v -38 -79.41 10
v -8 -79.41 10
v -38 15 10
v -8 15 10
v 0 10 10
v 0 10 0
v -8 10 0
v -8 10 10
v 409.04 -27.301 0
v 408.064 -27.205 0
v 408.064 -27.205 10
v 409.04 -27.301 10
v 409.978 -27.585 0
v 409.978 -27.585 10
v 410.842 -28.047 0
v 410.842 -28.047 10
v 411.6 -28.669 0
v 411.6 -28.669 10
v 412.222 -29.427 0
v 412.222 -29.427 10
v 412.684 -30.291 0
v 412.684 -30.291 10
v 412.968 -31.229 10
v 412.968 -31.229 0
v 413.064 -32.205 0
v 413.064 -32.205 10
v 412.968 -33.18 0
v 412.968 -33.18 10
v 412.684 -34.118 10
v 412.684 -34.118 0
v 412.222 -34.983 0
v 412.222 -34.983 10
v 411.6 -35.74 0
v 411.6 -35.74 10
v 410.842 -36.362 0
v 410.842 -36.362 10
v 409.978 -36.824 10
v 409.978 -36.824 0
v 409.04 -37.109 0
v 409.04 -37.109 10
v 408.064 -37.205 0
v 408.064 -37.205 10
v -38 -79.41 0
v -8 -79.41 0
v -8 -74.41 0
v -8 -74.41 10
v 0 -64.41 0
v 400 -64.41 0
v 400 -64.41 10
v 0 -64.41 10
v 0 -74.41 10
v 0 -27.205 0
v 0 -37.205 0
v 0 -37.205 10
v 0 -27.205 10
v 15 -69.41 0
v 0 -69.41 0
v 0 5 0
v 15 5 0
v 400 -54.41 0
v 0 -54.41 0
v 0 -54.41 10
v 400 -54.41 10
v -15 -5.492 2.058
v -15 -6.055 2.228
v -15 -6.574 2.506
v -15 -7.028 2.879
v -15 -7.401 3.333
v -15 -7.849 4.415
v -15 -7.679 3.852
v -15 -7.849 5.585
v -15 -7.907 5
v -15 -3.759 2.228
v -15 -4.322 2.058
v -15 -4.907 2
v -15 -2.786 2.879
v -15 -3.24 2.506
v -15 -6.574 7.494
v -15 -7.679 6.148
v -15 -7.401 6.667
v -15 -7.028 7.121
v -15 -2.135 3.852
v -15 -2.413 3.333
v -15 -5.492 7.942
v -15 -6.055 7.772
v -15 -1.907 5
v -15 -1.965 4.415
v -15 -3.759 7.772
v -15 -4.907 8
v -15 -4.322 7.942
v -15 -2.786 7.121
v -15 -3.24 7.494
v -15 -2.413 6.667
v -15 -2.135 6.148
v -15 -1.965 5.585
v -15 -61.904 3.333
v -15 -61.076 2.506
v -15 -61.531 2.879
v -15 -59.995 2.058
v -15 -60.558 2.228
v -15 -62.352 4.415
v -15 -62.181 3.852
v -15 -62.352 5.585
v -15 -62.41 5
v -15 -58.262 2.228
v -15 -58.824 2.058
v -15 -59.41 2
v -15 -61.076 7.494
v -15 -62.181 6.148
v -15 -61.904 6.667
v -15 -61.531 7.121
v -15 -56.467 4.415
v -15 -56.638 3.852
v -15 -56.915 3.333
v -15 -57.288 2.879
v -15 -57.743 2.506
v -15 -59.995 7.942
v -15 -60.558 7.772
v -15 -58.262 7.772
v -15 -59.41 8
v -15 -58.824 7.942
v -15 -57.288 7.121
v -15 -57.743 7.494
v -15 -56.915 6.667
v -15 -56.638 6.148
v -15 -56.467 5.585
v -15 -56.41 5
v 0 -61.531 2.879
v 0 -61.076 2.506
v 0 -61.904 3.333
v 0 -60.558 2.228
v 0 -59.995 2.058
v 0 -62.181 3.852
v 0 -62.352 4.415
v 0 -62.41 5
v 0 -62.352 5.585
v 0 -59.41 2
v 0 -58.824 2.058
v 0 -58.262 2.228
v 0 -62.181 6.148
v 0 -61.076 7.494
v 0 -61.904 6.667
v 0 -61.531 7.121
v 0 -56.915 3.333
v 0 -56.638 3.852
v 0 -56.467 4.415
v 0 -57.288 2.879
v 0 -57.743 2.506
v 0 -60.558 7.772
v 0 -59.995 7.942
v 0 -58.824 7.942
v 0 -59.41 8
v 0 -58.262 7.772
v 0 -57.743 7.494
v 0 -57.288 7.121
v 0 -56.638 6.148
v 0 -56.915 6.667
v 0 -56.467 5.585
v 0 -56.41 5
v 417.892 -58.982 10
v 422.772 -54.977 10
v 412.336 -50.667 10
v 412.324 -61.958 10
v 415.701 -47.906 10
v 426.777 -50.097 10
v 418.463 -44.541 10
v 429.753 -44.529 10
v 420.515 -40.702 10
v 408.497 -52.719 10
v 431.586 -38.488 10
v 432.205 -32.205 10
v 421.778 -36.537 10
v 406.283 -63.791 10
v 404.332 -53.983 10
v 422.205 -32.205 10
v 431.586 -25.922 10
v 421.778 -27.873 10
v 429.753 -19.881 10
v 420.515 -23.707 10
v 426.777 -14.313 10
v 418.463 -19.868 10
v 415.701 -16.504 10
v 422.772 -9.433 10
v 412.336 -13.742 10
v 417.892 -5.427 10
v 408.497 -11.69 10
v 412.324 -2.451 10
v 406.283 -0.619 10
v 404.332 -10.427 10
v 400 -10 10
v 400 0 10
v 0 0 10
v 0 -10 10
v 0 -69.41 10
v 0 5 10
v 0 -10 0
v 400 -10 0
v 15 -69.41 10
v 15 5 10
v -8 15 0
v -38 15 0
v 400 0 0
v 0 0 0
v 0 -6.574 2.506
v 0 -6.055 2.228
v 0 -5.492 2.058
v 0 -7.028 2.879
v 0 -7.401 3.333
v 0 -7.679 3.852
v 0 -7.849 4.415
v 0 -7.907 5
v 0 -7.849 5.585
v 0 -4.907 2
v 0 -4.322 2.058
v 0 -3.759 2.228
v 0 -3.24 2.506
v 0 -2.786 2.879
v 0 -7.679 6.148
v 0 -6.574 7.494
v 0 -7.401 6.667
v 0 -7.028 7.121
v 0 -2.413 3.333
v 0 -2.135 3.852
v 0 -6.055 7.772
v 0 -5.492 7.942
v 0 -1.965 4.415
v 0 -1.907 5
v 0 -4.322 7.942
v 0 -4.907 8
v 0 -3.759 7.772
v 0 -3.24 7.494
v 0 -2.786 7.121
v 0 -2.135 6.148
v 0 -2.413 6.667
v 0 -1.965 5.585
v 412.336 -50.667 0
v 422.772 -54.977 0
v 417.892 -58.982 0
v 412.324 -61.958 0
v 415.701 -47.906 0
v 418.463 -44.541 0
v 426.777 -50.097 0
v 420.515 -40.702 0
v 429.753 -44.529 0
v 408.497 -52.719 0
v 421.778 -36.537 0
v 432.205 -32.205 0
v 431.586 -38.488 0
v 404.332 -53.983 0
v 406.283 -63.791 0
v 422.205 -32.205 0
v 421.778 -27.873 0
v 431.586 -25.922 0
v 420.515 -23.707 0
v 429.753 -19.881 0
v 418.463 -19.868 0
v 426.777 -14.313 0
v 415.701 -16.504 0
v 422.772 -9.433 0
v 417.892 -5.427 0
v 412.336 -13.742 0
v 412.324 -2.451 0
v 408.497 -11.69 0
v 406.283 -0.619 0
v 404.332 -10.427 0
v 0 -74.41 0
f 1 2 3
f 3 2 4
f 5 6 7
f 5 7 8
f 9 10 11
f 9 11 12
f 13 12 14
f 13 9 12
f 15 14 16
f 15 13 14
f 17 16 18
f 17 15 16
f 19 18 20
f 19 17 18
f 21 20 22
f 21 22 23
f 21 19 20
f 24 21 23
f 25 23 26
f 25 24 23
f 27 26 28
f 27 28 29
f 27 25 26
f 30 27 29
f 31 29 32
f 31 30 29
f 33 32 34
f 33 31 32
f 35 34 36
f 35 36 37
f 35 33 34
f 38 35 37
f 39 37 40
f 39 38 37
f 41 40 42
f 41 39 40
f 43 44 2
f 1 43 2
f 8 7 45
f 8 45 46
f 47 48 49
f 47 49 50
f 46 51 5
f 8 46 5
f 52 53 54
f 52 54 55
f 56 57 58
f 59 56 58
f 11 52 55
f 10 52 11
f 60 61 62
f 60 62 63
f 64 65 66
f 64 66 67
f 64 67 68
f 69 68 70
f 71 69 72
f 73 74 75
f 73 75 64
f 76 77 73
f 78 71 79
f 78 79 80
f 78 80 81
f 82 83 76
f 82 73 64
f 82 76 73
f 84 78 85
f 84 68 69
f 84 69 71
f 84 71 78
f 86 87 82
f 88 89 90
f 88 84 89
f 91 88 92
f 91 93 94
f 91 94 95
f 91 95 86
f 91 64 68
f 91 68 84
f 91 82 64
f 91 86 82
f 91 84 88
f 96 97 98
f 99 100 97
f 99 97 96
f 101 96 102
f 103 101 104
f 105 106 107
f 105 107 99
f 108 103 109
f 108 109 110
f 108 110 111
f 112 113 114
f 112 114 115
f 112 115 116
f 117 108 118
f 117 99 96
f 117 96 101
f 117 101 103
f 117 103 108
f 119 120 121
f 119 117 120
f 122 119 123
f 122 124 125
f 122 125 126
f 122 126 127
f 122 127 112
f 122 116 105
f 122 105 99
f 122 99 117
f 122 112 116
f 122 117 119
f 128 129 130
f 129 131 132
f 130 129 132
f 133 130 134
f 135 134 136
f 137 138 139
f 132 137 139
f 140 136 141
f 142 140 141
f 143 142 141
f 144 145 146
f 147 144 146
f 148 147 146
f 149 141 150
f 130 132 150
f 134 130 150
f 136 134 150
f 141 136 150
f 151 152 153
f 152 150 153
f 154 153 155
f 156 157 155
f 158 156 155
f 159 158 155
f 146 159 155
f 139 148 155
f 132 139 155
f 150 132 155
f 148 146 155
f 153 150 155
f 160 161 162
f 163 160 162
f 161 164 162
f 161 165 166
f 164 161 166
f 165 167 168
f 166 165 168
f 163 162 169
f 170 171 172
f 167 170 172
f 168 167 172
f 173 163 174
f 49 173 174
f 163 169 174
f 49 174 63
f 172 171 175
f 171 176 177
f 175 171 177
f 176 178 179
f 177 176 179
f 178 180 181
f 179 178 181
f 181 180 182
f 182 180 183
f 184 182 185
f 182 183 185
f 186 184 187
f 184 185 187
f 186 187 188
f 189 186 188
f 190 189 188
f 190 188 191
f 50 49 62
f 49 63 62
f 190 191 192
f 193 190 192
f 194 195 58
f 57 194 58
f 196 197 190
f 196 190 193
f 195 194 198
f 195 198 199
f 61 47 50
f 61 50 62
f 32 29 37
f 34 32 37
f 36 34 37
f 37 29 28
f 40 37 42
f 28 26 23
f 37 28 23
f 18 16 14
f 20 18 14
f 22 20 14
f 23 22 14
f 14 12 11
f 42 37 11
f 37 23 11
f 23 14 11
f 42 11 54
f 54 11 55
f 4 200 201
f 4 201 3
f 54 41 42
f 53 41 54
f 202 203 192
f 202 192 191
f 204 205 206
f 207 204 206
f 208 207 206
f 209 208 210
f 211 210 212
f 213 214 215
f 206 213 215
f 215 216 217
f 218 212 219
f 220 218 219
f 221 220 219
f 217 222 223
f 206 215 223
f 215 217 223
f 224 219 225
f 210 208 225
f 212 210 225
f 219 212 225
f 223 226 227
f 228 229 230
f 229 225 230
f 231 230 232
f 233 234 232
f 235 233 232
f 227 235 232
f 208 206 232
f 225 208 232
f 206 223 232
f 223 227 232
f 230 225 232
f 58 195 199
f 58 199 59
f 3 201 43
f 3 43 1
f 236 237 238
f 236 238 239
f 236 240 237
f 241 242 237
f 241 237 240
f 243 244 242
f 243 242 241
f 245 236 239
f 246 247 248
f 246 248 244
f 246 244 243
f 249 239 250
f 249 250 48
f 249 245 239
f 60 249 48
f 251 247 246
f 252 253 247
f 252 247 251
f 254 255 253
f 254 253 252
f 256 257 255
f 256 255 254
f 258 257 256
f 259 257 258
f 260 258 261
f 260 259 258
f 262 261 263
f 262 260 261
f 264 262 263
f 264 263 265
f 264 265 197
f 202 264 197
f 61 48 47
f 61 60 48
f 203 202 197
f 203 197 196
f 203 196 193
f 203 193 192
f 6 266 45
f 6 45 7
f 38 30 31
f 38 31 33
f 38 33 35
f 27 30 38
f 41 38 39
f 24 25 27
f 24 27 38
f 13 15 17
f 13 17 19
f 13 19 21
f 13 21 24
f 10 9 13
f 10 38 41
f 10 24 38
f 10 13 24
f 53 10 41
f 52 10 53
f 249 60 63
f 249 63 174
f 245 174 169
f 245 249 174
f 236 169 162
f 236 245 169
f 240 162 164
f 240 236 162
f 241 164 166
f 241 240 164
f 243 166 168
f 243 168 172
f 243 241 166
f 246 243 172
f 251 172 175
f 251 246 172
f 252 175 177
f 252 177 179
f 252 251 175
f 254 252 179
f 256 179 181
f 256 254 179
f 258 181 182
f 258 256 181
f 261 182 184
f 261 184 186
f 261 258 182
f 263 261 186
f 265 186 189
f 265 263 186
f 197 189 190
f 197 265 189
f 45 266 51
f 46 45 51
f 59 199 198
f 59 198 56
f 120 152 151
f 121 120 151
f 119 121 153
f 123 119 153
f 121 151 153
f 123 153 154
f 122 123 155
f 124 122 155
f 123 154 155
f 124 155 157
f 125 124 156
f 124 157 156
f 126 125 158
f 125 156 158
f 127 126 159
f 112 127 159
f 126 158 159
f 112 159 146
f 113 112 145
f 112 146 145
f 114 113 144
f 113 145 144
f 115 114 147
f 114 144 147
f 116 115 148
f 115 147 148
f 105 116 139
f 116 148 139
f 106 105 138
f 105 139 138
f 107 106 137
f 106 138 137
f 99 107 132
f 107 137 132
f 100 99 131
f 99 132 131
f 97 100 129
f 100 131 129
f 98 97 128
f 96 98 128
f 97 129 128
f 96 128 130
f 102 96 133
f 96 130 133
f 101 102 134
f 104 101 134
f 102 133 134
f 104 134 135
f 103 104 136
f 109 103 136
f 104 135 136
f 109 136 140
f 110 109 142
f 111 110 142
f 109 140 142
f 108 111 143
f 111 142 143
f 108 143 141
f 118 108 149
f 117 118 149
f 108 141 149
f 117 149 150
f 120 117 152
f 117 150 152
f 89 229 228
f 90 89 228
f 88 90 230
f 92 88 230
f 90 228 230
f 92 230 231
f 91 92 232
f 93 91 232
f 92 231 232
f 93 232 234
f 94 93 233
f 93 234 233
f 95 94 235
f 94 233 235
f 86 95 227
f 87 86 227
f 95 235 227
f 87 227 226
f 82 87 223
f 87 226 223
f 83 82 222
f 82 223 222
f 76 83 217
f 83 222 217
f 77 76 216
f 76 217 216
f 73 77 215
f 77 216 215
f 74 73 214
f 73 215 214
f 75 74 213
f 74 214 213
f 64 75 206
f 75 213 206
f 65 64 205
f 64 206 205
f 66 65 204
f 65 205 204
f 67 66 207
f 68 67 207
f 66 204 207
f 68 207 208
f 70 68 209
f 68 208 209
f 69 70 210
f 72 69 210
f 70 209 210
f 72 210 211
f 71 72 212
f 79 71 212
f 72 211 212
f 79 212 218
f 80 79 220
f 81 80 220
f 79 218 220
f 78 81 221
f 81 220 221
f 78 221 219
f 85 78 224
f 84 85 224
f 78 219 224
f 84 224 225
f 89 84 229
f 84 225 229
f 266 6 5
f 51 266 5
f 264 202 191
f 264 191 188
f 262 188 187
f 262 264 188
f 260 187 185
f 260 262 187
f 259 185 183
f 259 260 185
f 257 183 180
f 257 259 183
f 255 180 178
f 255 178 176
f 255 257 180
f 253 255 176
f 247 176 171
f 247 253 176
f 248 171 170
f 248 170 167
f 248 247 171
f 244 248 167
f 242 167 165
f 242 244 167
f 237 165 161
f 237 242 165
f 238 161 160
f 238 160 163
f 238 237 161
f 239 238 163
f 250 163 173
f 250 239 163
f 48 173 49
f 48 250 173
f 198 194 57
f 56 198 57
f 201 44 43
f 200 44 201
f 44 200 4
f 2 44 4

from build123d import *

# Parameters (mm, degrees)
BOSS_EXTRUDE1_DEPTH   = 10
BOSS_EXTRUDE1_2_DEPTH = 10
SKETCH2_R             = 3
BOSS_EXTRUDE2_DEPTH   = 15
SKETCH3_R             = 3
BOSS_EXTRUDE3_DEPTH   = 15
SKETCH4_W             = 10
SKETCH4_H             = 74.409684446
BOSS_EXTRUDE4_DEPTH   = 15
SKETCH5_W             = 10
SKETCH5_H             = 84.409684446
BOSS_EXTRUDE5_DEPTH   = 8
SKETCH6_W             = 10
SKETCH6_H             = 94.409684446
BOSS_EXTRUDE6_DEPTH   = 30


with BuildPart() as part:
    # Sketch1 → Boss-Extrude1 (new body)
    with BuildSketch(Plane.XY):
        with BuildLine():
            Line((0, 0), (400, 0))
            ThreePointArc((400, 0), (432.204842223, -32.204842223), (400, -64.409684446))
            Line((400, -64.409684446), (0, -64.409684446))
            Line((0, -64.409684446), (0, -54.409684446))
            Line((0, -54.409684446), (400, -54.409684446))
            ThreePointArc((400, -54.409684446), (422.204842223, -32.204842223), (400, -10))
            Line((400, -10), (0, -10))
            Line((0, -10), (0, 0))
        make_face()
    extrude(amount=BOSS_EXTRUDE1_DEPTH)


with BuildPart() as body_2:
    # Sketch1 → Boss-Extrude1 2 (new body)
    with BuildSketch(Plane.XY):
        with BuildLine():
            Line((0, -27.204842223), (408.064158914, -27.204842223))
            ThreePointArc((408.064158914, -27.204842223), (413.064158914, -32.204842223), (408.064158914, -37.204842223))
            Line((408.064158914, -37.204842223), (0, -37.204842223))
            Line((0, -37.204842223), (0, -27.204842223))
        make_face()
    extrude(amount=BOSS_EXTRUDE1_2_DEPTH)


with BuildPart() as body_3:
    # Sketch2 → Boss-Extrude2 (new body)
    with BuildSketch(Plane.ZY):
        with Locations((5, -4.906979909)):
            Circle(SKETCH2_R)
    extrude(amount=BOSS_EXTRUDE2_DEPTH)


with BuildPart() as body_4:
    # Sketch3 → Boss-Extrude3 (new body)
    with BuildSketch(Plane.ZY):
        with Locations((5, -59.409684446)):
            Circle(SKETCH3_R)
    extrude(amount=BOSS_EXTRUDE3_DEPTH)


with BuildPart() as body_5:
    # Sketch4 → Boss-Extrude4 (new body)
    with BuildSketch(Plane(origin=(0, 0, 0), x_dir=(0, 0, -1), z_dir=(1, 0, 0))):
        with Locations((-5, -32.204842223)):
            Rectangle(SKETCH4_W, SKETCH4_H)
    extrude(amount=BOSS_EXTRUDE4_DEPTH)


with BuildPart() as body_6:
    # Sketch5 → Boss-Extrude5 (new body)
    with BuildSketch(Plane.ZY):
        with Locations((5, -32.204842223)):
            Rectangle(SKETCH5_W, SKETCH5_H)
    extrude(amount=BOSS_EXTRUDE5_DEPTH)


with BuildPart() as body_7:
    # Sketch6 → Boss-Extrude6 (new body)
    with BuildSketch(Plane.ZY.offset(8)):
        with Locations((5, -32.204842223)):
            Rectangle(SKETCH6_W, SKETCH6_H)
    extrude(amount=BOSS_EXTRUDE6_DEPTH)


solid = Compound([part.part, body_2.part, body_3.part, body_4.part, body_5.part, body_6.part, body_7.part])
